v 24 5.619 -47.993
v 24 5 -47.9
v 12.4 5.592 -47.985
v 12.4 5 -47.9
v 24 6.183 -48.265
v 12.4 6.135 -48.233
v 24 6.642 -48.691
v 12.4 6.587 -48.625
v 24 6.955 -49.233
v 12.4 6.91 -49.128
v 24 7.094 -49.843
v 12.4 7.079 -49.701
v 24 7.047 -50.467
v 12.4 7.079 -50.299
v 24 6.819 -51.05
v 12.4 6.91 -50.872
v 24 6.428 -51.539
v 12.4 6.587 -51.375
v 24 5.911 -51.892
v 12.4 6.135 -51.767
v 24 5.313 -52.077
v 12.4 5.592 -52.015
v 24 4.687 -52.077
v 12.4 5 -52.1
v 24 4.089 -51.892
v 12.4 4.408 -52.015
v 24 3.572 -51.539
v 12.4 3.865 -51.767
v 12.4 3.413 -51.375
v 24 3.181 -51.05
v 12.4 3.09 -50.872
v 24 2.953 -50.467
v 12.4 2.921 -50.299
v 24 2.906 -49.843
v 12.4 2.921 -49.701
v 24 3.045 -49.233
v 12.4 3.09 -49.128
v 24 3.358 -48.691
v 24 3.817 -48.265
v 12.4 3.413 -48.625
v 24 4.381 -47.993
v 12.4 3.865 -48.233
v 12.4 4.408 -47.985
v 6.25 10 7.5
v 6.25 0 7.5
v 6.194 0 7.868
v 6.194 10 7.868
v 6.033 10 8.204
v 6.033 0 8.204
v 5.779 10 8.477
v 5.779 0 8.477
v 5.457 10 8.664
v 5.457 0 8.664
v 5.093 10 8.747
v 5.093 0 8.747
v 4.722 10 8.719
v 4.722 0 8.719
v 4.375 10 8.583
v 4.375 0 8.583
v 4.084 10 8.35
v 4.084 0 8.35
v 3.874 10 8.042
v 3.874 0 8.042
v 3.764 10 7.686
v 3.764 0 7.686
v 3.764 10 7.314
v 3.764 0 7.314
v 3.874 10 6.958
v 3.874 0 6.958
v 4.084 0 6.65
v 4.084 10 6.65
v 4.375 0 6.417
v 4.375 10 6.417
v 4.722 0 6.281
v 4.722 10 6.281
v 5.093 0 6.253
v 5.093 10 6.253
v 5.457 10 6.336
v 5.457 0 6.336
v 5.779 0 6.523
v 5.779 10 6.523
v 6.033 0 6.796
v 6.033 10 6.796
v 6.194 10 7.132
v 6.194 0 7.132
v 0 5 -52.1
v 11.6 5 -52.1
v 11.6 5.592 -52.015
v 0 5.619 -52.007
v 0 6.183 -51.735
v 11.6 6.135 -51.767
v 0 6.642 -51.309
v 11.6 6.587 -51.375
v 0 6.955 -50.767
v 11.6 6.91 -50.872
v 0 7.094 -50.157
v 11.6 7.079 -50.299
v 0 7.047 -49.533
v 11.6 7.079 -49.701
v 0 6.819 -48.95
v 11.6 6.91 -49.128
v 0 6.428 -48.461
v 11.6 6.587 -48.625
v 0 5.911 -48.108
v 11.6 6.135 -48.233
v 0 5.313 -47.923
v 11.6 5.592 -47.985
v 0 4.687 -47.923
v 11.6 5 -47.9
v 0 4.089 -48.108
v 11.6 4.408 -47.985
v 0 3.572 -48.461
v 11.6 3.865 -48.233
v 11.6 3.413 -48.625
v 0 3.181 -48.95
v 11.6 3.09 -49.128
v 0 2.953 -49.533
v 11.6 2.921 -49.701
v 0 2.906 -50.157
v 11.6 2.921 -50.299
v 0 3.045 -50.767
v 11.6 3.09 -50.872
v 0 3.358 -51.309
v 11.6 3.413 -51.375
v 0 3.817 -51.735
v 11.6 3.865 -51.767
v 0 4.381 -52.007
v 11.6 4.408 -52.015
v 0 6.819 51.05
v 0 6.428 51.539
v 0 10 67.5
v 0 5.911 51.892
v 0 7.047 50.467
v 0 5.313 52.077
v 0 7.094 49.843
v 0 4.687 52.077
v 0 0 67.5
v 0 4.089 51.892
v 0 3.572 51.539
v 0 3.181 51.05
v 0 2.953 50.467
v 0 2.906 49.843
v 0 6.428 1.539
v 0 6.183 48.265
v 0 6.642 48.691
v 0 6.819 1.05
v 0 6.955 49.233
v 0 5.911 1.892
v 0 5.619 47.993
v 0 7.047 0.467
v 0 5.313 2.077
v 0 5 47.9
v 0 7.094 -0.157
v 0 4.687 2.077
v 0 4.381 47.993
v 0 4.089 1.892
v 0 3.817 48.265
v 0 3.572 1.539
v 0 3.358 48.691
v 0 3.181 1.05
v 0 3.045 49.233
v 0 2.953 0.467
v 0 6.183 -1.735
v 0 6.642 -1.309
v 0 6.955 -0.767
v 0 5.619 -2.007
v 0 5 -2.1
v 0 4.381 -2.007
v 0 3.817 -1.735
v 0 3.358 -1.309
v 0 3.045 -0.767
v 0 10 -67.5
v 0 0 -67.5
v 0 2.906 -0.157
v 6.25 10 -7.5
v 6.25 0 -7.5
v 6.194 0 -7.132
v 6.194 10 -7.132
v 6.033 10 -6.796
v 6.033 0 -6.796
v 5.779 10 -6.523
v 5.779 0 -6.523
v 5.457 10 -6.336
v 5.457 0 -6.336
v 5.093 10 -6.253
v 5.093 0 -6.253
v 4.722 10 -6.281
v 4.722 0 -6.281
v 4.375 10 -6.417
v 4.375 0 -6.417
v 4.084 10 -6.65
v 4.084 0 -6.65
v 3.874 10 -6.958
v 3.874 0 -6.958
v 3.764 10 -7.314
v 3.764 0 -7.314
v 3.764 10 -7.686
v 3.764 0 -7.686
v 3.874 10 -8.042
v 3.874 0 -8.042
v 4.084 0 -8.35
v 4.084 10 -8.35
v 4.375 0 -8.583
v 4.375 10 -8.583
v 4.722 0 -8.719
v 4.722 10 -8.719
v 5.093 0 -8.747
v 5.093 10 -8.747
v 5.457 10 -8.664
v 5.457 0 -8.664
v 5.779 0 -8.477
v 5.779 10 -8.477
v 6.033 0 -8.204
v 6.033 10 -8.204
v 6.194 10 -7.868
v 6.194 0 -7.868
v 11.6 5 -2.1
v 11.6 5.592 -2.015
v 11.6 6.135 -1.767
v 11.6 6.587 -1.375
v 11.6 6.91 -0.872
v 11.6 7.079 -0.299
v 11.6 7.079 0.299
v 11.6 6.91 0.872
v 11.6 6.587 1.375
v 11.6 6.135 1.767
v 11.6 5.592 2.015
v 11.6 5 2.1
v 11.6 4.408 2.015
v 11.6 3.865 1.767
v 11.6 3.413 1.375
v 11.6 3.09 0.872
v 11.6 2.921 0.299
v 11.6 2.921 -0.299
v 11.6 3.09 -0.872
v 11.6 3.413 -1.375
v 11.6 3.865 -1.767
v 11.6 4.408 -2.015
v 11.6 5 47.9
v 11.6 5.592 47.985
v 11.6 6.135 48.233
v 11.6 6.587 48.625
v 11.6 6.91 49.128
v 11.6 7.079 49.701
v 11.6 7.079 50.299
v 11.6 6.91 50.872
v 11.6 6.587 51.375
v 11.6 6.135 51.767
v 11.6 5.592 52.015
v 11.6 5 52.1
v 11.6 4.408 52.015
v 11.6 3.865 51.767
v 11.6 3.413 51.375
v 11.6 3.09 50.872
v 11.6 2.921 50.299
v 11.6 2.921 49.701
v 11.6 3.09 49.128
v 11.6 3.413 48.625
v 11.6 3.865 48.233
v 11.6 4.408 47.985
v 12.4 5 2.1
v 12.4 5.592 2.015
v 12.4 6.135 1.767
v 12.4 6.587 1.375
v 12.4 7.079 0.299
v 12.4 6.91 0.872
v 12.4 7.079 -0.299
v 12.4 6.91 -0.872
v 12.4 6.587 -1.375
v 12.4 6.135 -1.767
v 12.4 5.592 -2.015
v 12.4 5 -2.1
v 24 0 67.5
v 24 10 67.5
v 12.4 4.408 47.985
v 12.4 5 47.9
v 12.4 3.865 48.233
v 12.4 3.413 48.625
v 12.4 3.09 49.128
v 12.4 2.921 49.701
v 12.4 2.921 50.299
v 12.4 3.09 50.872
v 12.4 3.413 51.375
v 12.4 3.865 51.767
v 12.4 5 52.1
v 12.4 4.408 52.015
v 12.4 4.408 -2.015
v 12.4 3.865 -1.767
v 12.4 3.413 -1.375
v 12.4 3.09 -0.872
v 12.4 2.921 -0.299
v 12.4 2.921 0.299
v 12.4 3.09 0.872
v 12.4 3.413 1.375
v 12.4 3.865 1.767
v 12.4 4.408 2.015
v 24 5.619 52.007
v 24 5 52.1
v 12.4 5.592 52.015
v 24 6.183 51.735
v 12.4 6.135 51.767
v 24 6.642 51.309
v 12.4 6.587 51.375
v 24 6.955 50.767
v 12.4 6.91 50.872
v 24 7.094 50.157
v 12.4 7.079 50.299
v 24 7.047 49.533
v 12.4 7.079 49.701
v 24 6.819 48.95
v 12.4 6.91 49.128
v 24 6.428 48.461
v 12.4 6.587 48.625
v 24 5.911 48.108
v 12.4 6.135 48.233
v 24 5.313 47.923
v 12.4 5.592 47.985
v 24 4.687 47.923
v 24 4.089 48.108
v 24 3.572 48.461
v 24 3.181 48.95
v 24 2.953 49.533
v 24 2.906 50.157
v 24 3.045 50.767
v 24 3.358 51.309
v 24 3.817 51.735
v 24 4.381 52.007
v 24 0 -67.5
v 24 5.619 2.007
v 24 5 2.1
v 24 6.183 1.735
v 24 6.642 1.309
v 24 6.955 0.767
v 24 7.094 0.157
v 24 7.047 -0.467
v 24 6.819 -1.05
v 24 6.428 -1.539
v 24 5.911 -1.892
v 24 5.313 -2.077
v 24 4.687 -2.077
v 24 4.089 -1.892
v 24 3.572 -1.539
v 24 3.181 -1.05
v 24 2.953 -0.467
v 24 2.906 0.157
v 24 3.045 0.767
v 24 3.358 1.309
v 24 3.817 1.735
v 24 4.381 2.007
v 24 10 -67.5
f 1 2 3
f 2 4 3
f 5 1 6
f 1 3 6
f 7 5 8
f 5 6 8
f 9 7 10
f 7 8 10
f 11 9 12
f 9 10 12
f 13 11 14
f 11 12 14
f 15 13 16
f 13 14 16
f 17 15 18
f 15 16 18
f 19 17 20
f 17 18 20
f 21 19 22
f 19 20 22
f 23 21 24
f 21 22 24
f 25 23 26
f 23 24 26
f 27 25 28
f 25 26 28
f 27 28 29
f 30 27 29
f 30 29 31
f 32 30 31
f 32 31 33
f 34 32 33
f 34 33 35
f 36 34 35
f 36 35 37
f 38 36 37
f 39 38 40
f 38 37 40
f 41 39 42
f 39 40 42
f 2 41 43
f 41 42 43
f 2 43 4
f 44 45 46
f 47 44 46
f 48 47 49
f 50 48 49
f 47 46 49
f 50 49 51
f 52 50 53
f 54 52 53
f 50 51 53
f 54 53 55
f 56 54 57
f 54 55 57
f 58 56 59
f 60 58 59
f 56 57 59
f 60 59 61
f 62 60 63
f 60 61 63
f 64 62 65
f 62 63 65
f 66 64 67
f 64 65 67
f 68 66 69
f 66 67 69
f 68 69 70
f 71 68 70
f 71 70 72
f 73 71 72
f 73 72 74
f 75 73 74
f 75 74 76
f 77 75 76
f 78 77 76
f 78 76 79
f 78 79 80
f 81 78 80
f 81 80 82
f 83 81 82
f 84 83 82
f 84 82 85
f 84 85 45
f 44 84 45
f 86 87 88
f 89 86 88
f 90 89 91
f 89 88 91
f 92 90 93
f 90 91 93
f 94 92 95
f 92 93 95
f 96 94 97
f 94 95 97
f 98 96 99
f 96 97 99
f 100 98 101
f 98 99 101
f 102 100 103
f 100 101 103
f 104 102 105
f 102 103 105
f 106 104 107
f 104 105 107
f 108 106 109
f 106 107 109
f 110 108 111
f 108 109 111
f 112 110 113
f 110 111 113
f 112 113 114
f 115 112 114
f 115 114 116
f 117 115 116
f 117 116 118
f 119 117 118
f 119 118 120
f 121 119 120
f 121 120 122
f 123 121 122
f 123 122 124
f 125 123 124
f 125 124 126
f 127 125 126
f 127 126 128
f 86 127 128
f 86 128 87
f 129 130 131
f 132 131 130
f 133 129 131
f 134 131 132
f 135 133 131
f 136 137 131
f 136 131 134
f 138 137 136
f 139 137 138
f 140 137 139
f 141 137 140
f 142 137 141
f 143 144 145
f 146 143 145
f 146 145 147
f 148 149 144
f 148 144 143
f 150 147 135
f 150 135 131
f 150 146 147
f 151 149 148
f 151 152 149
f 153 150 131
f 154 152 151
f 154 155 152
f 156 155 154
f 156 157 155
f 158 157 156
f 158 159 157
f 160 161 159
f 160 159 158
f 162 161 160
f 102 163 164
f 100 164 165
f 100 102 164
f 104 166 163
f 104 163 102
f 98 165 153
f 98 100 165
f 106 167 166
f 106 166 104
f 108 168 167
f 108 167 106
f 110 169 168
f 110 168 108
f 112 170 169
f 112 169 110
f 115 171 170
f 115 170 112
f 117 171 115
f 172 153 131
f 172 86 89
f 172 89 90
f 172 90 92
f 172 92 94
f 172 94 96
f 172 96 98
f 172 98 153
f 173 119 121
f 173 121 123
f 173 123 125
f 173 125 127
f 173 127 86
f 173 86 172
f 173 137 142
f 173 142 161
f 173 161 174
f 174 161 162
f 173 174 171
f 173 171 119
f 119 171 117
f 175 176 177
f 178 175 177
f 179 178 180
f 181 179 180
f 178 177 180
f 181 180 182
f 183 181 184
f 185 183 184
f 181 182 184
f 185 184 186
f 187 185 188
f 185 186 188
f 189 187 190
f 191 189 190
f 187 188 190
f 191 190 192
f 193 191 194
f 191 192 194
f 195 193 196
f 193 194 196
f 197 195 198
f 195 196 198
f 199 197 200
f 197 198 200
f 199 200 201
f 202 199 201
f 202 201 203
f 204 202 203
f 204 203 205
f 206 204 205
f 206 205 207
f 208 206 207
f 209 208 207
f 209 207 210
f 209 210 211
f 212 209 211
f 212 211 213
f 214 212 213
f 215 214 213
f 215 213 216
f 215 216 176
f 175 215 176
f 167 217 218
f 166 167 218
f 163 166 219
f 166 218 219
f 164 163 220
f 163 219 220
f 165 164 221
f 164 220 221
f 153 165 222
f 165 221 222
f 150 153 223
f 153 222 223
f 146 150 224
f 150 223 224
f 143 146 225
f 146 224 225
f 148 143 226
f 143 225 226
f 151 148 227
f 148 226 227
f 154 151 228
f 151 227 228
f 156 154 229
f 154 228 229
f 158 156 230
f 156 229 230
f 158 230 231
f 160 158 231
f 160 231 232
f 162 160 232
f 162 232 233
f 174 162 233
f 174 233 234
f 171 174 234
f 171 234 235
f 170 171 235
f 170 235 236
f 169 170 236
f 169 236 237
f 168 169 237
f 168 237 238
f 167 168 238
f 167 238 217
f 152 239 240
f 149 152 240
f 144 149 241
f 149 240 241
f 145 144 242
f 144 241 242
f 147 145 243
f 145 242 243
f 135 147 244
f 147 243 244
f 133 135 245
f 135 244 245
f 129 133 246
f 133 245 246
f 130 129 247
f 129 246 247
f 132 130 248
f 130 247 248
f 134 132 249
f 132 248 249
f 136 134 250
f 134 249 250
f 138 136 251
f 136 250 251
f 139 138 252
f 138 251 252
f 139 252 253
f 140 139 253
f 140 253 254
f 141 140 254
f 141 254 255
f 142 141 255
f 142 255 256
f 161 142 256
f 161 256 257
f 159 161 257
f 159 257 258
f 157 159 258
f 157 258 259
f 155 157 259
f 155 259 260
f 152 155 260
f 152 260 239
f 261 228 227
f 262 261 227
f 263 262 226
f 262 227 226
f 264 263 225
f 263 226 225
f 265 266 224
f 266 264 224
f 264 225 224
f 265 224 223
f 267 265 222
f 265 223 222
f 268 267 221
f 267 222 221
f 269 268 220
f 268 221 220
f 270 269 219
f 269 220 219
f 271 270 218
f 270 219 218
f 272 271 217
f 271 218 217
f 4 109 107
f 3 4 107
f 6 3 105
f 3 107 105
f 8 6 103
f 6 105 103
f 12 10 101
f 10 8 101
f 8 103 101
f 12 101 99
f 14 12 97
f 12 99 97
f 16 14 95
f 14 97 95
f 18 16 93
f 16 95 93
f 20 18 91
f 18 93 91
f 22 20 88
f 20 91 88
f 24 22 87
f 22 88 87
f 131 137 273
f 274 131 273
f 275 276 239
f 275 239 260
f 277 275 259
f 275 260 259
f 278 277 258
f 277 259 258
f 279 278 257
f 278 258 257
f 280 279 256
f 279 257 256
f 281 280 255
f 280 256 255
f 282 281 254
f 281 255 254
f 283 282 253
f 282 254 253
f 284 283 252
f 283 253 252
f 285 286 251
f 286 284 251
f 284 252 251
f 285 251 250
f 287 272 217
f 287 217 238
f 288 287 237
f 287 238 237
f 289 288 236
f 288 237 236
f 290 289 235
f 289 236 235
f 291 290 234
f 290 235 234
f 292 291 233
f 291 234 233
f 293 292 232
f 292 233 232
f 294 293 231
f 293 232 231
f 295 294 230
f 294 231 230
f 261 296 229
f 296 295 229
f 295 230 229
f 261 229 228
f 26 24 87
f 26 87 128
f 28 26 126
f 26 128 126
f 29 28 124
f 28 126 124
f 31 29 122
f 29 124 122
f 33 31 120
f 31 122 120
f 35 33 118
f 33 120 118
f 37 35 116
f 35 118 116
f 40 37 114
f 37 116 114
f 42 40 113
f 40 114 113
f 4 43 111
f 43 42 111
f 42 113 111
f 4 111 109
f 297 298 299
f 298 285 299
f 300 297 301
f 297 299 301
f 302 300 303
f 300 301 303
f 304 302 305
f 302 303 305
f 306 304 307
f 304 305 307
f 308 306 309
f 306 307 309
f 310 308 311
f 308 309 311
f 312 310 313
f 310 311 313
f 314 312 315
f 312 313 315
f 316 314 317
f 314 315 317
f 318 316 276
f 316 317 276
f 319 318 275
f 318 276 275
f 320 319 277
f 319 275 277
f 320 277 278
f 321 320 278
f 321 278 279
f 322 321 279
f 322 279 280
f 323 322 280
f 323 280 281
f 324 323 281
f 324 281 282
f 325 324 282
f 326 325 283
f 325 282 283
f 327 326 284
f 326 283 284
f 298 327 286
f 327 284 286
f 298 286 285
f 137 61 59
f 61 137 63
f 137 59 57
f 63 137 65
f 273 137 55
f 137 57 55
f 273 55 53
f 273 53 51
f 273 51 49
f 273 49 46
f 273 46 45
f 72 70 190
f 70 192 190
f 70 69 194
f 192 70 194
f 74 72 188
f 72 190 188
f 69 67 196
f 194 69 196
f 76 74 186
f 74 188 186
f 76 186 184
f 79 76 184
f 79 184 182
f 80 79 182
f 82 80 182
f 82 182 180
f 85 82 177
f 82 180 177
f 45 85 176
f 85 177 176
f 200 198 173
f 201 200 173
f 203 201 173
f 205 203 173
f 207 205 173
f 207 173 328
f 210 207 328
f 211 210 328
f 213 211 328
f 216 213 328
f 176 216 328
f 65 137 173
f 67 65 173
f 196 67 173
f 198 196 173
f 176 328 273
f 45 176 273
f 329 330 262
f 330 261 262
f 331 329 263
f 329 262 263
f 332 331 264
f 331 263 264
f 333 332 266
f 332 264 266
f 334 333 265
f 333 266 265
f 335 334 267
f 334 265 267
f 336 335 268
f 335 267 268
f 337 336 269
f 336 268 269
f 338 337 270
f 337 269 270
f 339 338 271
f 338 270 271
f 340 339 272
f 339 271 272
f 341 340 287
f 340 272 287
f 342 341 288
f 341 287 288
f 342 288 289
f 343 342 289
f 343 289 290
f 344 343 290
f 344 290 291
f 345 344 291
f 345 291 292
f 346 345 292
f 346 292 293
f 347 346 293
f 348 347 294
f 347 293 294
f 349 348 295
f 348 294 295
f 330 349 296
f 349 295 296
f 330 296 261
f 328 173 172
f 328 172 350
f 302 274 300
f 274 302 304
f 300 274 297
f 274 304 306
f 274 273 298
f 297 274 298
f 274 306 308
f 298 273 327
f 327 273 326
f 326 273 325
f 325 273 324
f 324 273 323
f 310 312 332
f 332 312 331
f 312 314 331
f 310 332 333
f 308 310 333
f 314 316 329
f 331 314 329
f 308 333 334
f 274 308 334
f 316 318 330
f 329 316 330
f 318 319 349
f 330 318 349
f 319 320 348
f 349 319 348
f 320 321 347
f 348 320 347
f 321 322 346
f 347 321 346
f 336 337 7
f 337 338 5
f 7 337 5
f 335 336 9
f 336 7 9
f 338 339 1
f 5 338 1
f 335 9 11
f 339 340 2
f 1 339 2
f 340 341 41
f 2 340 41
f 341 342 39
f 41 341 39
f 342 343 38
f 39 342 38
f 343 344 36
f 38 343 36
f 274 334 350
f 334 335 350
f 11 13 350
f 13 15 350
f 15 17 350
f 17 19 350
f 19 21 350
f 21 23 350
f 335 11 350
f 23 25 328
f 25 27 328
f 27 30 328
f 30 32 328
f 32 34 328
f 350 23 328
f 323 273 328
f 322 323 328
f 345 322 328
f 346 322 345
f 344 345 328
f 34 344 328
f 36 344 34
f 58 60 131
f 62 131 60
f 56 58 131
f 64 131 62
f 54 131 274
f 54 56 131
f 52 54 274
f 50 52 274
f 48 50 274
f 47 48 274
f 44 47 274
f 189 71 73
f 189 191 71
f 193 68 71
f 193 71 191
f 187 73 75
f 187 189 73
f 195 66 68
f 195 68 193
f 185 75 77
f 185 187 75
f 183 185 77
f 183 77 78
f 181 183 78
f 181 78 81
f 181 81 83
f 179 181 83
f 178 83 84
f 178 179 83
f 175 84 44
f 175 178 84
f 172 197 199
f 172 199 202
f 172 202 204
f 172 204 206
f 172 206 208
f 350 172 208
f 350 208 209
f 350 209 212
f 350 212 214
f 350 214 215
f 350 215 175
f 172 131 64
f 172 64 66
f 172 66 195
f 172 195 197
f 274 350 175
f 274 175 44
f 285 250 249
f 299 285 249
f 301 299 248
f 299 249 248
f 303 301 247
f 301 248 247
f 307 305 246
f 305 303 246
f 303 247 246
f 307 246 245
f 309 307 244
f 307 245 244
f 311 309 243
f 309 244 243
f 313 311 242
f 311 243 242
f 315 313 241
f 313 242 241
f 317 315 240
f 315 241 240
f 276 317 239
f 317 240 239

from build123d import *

# Parameters (mm, degrees)
SKETCH1_W                 = 24
SKETCH1_H                 = 135
BOSS_EXTRUDE1_DEPTH       = 10
M5X0_8_TAPPED_HOLE1_D     = 4.2
M5X0_8_TAPPED_HOLE1_DEPTH = 12.4
M5X0_8_TAPPED_HOLE1_TIP   = 1.2618073
M5X0_8_TAPPED_HOLE2_D     = 4.2
M5X0_8_TAPPED_HOLE2_DEPTH = 12.4
M5X0_8_TAPPED_HOLE2_TIP   = 1.2618073
M3X0_5_TAPPED_HOLE1_D     = 2.5


with BuildPart() as part:
    # Sketch1 → Boss-Extrude1 (new body)
    with BuildSketch(Plane(origin=(0, 0, 0), x_dir=(1, 0, 0), z_dir=(0, 1, 0))):
        with Locations((12, 0)):
            Rectangle(SKETCH1_W, SKETCH1_H)
    extrude(amount=BOSS_EXTRUDE1_DEPTH)

    # M5x0.8 Tapped Hole1
    with Locations(Plane(origin=(24, 0, 0), x_dir=(0, 0, -1), z_dir=(1, 0, 0))):
        with Locations((0, 5), (-50, 5), (50, 5)):
            Hole(M5X0_8_TAPPED_HOLE1_D / 2, depth=M5X0_8_TAPPED_HOLE1_DEPTH)
            with Locations((0, 0, -(M5X0_8_TAPPED_HOLE1_DEPTH + M5X0_8_TAPPED_HOLE1_TIP / 2))):  # 118° drill point
                Cone(0, M5X0_8_TAPPED_HOLE1_D / 2, M5X0_8_TAPPED_HOLE1_TIP, mode=Mode.SUBTRACT)

    # M5x0.8 Tapped Hole2
    with Locations(Plane.ZY):
        with Locations((50, 5), (0, 5), (-50, 5)):
            Hole(M5X0_8_TAPPED_HOLE2_D / 2, depth=M5X0_8_TAPPED_HOLE2_DEPTH)
            with Locations((0, 0, -(M5X0_8_TAPPED_HOLE2_DEPTH + M5X0_8_TAPPED_HOLE2_TIP / 2))):  # 118° drill point
                Cone(0, M5X0_8_TAPPED_HOLE2_D / 2, M5X0_8_TAPPED_HOLE2_TIP, mode=Mode.SUBTRACT)

    # M3x0.5 Tapped Hole1 (through all)
    with Locations(Plane(origin=(0, 10, 0), x_dir=(-1, 0, 0), z_dir=(0, 1, 0))):
        with Locations((-5, -7.5), (-5, 7.5)):
            Hole(M3X0_5_TAPPED_HOLE1_D / 2)


solid = part.part
